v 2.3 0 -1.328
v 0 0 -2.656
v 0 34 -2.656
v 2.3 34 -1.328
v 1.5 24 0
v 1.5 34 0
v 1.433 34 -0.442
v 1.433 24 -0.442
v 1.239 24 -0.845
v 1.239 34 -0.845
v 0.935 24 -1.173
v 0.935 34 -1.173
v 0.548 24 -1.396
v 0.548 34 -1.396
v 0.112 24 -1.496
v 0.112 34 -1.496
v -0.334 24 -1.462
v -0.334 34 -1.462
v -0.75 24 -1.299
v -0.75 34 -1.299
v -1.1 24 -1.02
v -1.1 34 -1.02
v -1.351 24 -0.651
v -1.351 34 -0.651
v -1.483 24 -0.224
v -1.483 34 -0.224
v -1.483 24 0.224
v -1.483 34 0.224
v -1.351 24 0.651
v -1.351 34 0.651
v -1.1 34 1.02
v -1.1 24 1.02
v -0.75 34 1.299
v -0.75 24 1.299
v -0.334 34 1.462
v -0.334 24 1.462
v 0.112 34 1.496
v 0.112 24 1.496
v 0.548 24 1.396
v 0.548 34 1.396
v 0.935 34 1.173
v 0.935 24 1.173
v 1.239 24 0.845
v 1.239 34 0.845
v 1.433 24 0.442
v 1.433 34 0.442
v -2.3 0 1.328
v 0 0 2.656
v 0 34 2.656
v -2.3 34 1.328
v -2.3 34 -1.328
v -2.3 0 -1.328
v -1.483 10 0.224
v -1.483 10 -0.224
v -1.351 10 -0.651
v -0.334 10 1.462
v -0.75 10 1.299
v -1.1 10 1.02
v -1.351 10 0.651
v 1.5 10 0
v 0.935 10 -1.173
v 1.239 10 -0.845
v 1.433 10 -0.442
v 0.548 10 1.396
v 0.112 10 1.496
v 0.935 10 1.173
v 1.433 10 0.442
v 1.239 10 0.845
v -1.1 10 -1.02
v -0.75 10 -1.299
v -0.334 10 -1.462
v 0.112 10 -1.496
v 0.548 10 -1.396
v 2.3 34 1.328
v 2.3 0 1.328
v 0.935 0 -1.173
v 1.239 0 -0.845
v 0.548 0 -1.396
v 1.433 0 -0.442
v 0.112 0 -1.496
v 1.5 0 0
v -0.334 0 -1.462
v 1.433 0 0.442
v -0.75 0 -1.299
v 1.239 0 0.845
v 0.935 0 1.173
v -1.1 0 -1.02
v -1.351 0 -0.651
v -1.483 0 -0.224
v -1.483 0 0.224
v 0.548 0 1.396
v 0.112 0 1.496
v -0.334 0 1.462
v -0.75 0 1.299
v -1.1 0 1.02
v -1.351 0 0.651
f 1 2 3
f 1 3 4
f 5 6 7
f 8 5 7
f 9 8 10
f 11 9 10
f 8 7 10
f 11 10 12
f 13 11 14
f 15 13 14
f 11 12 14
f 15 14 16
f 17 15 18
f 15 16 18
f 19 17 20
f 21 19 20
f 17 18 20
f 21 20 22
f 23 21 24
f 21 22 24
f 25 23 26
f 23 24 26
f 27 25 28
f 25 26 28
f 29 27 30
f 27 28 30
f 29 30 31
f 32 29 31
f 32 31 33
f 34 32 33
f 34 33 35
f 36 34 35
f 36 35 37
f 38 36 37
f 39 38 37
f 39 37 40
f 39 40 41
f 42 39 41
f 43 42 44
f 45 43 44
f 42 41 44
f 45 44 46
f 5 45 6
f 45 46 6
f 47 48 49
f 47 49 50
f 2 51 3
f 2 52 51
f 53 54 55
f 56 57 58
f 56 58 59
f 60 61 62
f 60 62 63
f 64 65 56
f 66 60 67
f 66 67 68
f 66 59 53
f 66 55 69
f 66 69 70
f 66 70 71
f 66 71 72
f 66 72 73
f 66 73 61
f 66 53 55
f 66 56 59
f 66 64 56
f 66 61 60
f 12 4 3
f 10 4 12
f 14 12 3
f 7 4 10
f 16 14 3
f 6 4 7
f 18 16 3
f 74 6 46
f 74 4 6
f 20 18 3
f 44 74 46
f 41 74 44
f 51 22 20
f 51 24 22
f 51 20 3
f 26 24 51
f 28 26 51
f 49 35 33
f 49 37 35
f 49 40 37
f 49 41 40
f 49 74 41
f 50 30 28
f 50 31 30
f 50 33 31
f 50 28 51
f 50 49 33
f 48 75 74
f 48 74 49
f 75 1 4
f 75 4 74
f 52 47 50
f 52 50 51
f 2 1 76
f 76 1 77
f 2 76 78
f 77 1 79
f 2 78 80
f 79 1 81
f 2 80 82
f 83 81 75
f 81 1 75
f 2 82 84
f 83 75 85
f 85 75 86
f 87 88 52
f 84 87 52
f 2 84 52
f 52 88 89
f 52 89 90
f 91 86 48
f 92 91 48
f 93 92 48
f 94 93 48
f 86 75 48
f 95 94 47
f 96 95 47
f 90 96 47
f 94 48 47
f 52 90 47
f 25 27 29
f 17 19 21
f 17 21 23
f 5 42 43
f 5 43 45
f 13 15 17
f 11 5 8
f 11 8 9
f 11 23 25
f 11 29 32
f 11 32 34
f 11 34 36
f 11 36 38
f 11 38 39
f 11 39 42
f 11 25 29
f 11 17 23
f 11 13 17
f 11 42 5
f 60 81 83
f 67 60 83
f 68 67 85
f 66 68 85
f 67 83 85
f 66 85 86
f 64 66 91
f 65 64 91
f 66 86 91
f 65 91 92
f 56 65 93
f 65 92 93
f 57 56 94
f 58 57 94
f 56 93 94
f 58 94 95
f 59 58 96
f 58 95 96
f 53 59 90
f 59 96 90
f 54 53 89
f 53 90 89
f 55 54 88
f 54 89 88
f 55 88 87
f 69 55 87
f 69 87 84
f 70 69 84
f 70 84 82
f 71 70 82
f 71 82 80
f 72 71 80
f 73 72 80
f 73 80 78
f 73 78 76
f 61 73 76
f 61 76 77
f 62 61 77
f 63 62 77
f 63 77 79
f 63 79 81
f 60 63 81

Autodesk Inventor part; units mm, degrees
ref_plane "YZ Plane" through (0, 0, 0) normal (1, 0, 0) x (0, 1, 0)
ref_plane "XZ Plane" through (0, 0, 0) normal (0, 1, 0) x (-1, 0, 0)
ref_plane "XY Plane" through (0, 0, 0) normal (0, 0, 1) x (1, 0, 0)
sketch "Sketch1" plane through (0, 0, 0) normal (0, 1, 0) x (-1, 0, 0)
  line L0 (0, -2.6558) -> (-2.3, -1.3279)
  line L1 (-2.3, -1.3279) -> (-2.3, 1.3279)
  line L2 (-2.3, 1.3279) -> (0, 2.6558)
  line L3 (0, 2.6558) -> (2.3, 1.3279)
  line L4 (2.3, 1.3279) -> (2.3, -1.3279)
  line L5 (2.3, -1.3279) -> (0, -2.6558)
  point P0 (0, 0)
  point P1 (0, 0)
  dimension "d0" = 4.6
extrude "Extrusion1" add sketch "Sketch1" along normal blind 34
sketch "Sketch2" plane through (0, 34, 0) normal (0, 1, 0) x (1, 0, 0)
  circle A0 centre (0, 0) radius 1.5
  dimension "d3" = 3
extrude "Extrusion2" cut sketch "Sketch2" against normal blind 10
sketch "Sketch3" plane through (0, 0, 0) normal (0, -1, 0) x (1, 0, 0)
  circle A0 centre (0, 0) radius 1.5
  dimension "d6" = 3
extrude "Extrusion3" cut sketch "Sketch3" against normal blind 10
properties part number "M3_34_MM_STANDOFF_PIN"
